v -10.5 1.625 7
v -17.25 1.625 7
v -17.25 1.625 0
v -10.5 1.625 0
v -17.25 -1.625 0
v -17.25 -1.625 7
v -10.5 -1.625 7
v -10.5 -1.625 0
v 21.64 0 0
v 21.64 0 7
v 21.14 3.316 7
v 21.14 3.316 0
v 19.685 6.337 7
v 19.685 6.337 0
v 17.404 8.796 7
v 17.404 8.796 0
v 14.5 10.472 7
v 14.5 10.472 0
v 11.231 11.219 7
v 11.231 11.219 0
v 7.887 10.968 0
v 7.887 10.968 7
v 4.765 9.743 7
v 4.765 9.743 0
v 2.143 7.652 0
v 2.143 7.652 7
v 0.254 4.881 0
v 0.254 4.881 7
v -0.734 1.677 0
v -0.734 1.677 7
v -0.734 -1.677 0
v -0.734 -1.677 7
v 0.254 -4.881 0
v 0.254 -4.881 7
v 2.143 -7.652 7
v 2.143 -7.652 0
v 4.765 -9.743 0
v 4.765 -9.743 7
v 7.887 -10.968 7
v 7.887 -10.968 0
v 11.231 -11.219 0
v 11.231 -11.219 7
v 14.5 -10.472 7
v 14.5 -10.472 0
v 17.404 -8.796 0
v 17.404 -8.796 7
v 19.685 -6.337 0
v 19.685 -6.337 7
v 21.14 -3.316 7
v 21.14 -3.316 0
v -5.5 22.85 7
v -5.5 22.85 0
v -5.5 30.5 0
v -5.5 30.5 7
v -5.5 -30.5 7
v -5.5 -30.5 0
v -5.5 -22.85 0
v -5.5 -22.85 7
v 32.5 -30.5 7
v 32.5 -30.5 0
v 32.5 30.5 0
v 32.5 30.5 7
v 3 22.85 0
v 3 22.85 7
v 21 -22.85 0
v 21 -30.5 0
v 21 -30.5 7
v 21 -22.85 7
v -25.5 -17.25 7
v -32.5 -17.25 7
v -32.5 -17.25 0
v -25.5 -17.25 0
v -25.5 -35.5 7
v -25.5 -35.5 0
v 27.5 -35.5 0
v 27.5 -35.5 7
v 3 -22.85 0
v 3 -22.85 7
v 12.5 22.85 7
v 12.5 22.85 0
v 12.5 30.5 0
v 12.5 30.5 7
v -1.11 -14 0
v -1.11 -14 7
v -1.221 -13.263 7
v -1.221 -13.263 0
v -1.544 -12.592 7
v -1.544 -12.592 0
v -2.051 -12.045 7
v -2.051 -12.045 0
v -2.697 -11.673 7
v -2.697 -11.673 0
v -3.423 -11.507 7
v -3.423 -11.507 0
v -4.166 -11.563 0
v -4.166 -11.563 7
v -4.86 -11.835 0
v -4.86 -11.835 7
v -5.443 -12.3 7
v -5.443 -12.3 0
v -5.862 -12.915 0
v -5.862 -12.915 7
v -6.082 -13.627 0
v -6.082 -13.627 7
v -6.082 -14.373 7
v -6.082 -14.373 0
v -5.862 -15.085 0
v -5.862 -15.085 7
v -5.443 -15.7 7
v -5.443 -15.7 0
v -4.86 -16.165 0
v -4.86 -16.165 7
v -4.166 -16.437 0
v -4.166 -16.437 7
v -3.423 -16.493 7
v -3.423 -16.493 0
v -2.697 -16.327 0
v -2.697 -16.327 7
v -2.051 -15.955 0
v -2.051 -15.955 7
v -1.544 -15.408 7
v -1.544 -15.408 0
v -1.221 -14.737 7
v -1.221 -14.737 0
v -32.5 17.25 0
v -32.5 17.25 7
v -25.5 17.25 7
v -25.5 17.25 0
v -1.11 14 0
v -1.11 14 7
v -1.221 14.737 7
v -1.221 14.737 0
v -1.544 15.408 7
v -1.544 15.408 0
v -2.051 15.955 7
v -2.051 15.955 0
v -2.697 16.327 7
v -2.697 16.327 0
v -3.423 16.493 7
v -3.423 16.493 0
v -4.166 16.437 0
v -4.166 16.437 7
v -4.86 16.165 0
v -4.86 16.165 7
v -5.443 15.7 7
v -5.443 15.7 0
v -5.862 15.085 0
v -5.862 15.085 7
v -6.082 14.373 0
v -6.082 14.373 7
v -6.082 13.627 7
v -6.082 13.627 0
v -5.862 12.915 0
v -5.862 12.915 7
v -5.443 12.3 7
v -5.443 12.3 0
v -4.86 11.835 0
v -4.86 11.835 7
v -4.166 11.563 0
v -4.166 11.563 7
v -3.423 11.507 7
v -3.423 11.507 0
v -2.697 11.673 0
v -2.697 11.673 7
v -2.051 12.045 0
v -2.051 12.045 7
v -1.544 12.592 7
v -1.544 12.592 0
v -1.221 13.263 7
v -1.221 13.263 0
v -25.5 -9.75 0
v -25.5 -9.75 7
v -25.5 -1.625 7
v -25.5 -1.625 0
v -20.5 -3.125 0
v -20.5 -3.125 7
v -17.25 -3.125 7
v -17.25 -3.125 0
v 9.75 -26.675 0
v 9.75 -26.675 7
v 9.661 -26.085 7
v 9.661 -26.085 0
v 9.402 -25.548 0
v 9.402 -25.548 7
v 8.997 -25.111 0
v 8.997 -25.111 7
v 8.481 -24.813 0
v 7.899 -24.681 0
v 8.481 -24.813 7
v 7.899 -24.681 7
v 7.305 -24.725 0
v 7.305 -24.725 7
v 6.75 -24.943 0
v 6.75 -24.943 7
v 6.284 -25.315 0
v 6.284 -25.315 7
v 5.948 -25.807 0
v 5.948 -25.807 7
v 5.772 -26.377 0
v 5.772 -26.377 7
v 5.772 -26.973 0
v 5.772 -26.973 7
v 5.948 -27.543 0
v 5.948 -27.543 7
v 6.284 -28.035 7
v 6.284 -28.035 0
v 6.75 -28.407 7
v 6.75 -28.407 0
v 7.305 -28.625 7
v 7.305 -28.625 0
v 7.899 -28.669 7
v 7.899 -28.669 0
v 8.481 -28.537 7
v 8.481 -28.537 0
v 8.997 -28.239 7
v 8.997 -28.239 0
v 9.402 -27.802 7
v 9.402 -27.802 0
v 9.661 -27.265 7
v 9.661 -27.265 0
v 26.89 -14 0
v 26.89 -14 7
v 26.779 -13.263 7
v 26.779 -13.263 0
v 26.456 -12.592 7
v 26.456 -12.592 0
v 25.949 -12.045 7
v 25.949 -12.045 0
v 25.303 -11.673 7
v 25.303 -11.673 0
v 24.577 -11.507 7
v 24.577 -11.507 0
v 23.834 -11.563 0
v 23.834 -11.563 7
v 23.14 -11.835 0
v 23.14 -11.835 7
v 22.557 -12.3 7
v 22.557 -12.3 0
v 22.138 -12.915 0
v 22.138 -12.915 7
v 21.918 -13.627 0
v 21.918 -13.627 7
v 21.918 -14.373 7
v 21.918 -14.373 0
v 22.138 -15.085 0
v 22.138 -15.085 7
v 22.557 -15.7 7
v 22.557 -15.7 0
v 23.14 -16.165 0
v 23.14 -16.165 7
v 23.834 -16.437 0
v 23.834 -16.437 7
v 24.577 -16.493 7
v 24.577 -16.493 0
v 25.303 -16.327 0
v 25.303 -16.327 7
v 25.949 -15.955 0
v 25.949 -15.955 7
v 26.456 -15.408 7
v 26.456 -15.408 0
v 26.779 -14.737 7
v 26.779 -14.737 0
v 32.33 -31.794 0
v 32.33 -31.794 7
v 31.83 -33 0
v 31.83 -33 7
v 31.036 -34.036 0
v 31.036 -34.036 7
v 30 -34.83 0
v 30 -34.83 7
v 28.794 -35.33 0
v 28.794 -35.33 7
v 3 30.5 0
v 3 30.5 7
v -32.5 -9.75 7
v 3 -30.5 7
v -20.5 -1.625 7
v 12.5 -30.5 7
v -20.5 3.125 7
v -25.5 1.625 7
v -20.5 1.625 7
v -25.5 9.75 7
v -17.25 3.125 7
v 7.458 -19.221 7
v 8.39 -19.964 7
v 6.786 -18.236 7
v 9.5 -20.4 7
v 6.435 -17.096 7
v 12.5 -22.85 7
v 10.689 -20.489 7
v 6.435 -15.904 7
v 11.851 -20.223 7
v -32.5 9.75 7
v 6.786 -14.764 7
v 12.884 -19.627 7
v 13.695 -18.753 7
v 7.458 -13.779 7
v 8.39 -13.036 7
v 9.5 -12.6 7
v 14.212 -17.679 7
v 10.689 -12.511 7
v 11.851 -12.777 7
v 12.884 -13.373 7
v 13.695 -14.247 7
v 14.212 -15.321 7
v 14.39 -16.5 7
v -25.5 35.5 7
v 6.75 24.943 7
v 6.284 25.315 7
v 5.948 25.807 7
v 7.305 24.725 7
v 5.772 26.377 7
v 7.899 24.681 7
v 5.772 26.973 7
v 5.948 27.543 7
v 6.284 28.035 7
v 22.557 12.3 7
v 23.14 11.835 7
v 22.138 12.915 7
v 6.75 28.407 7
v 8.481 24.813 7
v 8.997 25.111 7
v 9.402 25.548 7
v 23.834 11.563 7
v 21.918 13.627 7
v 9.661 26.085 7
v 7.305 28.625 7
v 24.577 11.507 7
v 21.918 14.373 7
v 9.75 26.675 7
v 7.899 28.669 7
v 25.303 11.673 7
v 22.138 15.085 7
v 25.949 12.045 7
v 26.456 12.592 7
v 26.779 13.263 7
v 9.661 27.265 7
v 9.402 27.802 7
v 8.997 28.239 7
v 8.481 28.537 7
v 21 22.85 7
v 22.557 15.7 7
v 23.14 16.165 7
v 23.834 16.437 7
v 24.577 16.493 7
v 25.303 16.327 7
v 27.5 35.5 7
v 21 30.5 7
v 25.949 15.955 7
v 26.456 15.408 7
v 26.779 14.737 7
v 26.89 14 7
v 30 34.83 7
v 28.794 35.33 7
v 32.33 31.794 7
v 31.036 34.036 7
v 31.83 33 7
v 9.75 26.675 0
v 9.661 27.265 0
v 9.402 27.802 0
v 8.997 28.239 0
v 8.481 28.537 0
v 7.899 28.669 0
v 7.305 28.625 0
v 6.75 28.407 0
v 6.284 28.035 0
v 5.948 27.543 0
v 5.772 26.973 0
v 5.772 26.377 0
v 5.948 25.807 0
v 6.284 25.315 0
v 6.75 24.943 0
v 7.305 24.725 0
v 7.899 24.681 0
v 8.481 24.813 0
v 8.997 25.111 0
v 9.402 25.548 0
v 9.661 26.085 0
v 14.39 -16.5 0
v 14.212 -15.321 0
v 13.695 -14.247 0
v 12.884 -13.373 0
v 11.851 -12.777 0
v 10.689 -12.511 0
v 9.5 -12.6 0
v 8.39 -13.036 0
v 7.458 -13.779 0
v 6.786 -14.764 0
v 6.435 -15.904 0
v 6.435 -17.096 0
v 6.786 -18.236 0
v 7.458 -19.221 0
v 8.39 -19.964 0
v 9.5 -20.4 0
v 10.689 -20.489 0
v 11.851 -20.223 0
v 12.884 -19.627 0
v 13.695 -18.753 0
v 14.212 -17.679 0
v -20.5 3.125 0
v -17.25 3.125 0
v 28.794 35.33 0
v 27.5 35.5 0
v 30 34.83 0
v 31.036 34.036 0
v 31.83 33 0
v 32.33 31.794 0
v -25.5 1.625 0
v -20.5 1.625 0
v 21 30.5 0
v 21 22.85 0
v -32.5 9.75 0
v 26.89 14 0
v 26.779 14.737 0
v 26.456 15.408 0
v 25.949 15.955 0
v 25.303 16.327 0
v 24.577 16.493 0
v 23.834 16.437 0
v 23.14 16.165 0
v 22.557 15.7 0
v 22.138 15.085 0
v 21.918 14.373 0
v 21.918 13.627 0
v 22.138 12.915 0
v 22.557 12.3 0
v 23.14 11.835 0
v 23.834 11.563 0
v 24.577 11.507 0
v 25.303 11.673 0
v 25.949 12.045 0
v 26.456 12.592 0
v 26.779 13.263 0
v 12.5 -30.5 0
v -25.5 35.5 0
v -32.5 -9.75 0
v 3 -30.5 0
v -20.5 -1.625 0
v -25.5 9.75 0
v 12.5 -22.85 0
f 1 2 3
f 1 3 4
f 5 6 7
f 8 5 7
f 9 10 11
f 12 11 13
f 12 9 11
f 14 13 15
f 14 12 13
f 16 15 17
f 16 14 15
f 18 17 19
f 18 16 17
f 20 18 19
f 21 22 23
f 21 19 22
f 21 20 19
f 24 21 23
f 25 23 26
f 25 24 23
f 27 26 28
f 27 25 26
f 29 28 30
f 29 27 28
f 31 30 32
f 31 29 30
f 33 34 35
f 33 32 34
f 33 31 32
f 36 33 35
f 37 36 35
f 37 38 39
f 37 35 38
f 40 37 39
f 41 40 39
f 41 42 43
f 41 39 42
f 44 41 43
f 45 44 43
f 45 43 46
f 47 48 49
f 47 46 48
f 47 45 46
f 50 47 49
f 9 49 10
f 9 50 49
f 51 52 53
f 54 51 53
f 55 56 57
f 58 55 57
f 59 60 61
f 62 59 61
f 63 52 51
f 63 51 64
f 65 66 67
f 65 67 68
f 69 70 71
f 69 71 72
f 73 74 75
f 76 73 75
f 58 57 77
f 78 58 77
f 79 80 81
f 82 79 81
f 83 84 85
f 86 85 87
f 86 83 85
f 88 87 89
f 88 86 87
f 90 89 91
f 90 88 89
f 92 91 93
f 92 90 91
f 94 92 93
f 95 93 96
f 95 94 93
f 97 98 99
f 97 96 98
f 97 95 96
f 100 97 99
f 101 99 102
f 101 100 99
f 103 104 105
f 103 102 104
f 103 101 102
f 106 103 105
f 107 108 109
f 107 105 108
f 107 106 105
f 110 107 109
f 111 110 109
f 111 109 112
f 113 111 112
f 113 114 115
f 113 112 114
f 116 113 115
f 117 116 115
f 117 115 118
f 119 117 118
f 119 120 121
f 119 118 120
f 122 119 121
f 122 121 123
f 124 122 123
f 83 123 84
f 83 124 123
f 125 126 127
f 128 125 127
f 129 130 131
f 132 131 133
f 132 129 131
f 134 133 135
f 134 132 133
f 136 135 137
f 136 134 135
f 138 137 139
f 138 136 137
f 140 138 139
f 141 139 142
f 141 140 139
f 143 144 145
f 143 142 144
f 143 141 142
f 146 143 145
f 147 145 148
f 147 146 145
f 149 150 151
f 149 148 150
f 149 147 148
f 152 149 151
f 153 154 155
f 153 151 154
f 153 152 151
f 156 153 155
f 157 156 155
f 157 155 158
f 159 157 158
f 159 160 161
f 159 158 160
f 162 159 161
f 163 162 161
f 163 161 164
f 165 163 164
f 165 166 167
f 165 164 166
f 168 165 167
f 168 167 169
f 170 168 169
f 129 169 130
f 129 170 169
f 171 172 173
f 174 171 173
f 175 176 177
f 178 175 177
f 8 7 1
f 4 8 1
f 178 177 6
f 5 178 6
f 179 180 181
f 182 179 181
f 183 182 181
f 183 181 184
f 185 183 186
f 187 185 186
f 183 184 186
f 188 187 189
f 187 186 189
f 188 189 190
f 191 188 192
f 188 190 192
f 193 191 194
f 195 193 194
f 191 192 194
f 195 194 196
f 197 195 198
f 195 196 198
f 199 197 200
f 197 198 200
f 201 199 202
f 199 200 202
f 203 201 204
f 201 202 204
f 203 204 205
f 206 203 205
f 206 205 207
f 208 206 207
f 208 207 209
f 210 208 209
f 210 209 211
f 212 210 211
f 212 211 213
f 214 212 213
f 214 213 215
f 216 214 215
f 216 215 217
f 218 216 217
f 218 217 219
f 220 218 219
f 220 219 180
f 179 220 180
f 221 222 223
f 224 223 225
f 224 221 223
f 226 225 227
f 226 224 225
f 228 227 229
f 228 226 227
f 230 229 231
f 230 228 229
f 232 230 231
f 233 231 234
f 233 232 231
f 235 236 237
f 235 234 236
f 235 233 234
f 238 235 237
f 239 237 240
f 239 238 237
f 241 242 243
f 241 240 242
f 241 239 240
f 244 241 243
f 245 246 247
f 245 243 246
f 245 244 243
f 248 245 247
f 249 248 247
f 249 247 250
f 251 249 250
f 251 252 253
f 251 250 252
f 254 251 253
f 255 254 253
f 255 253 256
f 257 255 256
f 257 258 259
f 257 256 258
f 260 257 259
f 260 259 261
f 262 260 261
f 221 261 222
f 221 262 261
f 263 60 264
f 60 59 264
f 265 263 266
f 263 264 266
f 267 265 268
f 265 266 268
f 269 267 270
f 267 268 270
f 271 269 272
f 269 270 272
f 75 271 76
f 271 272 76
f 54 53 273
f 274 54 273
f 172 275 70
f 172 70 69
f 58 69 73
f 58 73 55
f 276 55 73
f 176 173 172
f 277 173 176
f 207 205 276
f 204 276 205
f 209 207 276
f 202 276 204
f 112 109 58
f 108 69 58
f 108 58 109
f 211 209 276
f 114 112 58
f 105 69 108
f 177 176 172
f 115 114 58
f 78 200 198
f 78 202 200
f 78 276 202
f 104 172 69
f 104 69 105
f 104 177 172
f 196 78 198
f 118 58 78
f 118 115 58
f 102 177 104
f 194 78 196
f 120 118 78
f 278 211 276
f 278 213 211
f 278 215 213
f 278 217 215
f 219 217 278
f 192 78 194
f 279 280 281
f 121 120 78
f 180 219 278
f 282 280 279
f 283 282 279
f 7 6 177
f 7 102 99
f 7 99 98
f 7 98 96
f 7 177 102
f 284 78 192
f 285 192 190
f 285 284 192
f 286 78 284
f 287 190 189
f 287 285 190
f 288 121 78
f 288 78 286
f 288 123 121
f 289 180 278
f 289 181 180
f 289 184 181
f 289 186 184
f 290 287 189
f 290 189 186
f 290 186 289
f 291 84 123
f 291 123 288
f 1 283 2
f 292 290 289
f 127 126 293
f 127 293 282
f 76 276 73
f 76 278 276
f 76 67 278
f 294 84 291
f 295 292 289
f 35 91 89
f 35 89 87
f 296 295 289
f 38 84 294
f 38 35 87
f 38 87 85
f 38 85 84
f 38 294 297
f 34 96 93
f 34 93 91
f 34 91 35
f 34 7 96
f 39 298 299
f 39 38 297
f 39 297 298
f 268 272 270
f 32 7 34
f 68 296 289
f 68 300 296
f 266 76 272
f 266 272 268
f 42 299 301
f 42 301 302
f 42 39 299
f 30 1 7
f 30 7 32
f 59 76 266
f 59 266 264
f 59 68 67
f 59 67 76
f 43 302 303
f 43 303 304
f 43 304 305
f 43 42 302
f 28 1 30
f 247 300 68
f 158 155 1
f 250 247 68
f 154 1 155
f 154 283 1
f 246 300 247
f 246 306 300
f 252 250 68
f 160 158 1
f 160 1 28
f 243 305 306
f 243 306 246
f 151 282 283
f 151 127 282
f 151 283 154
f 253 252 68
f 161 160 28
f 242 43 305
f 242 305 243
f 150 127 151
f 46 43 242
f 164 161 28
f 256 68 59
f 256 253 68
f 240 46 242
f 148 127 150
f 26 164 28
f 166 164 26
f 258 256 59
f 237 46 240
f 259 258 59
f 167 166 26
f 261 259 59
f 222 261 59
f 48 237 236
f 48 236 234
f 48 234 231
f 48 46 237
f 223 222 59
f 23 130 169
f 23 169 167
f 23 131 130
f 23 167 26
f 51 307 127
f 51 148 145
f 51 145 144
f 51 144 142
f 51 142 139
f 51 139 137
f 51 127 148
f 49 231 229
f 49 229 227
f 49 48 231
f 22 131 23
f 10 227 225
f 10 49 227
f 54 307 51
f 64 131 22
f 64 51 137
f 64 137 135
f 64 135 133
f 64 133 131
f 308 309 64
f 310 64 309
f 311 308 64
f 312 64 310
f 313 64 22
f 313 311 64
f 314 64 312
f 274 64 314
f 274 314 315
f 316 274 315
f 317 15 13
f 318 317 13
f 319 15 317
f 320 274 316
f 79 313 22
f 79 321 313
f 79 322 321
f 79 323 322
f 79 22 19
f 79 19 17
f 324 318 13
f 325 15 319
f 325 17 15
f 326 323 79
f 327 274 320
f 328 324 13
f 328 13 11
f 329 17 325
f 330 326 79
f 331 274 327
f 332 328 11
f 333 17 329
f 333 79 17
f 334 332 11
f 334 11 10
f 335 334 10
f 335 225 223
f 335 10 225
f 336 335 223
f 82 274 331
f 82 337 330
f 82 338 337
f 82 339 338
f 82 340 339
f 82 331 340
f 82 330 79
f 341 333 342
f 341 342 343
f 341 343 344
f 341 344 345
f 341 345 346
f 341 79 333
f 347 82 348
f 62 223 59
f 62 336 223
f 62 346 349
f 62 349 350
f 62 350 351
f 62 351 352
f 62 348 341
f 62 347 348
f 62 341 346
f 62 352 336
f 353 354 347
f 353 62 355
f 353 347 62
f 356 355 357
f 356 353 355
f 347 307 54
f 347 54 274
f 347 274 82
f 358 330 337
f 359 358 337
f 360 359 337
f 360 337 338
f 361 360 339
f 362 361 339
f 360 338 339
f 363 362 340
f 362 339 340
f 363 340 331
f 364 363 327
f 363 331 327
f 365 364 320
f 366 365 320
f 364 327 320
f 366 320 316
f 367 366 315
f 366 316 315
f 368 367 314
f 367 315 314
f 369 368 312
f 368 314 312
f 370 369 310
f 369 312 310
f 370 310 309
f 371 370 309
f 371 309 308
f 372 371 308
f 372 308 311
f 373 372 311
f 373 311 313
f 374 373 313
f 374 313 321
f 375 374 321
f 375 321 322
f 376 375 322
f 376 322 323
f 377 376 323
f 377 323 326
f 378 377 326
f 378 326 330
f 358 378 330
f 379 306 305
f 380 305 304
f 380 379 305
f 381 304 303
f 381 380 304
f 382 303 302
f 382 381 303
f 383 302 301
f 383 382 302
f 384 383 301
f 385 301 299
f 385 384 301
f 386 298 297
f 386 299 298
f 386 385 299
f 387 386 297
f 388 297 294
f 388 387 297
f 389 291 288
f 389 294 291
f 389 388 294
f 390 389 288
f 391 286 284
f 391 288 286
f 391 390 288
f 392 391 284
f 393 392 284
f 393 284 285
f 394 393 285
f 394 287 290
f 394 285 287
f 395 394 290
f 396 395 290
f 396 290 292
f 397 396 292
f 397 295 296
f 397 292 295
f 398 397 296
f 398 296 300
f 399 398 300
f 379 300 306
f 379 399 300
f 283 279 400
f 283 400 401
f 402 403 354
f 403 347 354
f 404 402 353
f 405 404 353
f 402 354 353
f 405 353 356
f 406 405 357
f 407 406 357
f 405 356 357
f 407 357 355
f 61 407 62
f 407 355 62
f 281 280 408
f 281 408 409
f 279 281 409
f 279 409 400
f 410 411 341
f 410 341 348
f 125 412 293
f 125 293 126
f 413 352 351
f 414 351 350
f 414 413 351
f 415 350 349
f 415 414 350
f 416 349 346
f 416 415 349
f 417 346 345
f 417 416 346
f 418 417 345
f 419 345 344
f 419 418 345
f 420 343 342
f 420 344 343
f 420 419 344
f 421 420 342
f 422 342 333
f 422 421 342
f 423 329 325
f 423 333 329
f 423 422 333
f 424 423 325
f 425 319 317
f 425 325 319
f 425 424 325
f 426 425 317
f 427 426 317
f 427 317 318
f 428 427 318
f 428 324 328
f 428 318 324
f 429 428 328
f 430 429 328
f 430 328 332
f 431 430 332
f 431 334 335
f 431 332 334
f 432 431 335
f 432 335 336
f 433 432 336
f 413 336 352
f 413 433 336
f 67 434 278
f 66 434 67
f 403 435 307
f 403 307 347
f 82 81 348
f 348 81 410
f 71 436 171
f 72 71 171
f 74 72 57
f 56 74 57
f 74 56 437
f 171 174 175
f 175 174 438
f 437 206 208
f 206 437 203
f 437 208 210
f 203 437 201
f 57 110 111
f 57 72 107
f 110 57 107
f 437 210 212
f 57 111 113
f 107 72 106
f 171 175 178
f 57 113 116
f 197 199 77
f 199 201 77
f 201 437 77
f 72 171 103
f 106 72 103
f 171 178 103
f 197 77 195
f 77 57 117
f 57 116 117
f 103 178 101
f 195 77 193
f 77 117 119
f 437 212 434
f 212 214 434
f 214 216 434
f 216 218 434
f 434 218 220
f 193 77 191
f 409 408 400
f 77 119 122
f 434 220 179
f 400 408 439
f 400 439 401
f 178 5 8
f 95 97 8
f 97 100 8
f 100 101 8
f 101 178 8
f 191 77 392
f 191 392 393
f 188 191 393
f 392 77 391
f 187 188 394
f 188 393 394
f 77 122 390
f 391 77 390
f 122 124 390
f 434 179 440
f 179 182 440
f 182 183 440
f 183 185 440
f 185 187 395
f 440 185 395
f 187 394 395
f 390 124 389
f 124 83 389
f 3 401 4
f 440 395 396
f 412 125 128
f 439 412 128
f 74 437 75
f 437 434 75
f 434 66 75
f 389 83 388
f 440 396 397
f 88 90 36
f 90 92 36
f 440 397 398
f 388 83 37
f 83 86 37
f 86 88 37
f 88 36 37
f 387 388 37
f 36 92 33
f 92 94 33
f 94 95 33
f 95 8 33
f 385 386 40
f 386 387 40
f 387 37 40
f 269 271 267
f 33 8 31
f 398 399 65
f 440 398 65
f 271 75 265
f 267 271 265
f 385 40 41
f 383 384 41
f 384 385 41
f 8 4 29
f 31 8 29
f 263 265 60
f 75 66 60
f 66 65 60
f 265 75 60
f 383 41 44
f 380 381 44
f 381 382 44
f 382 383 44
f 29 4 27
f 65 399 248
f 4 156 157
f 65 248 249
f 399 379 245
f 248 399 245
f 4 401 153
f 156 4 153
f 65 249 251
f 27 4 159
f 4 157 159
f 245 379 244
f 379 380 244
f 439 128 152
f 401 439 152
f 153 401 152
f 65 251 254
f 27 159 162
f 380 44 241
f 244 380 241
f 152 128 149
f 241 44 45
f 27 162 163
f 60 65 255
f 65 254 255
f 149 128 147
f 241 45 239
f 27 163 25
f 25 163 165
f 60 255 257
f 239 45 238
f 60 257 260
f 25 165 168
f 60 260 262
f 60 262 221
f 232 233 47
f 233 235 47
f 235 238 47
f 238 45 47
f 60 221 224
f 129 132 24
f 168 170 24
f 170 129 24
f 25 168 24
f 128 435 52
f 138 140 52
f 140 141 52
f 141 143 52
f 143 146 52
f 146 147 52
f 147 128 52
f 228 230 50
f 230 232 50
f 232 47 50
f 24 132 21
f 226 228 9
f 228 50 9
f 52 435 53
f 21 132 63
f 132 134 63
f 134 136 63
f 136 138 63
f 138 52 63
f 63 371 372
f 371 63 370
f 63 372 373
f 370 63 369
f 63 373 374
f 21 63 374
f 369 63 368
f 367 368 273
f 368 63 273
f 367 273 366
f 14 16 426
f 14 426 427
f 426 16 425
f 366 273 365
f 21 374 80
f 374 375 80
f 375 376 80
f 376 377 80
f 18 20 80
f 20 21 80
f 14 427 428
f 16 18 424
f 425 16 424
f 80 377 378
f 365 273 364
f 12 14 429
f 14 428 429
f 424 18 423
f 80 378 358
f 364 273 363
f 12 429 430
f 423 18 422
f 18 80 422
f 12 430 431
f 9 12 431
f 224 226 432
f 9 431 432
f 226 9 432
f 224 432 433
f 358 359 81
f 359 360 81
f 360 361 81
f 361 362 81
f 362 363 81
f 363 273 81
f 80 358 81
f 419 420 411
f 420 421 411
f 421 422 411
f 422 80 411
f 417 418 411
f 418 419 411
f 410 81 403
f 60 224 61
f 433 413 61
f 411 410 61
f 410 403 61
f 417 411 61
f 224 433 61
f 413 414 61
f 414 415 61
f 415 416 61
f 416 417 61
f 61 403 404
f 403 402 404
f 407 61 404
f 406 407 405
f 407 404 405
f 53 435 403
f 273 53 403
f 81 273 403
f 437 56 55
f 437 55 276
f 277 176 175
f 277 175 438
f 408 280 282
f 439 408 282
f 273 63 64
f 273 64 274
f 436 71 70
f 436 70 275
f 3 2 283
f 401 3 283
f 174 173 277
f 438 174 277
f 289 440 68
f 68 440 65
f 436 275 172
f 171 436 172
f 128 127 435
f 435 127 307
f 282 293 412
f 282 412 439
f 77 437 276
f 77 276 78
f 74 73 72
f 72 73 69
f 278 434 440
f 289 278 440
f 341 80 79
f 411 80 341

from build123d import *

# Parameters (mm, degrees)
F0_W      = 65
F0_H      = 71
F0_W_2    = 8.5
F0_H_2    = 7.65
F2_DEPTH  = 7
F1_R      = 4
F1_R_2    = 11.25
F1_R_3    = 2.5
F3_DEPTH  = 25
F4_R      = 2
F5_DEPTH  = 7.001
F6_W      = 7
F6_H      = 18.25
F6_H_2    = 19.5
F7_DEPTH  = 7.001
F8_W      = 30
F8_H      = 3.25
F9_W      = 3.25
F9_H      = 6.25
F10_DEPTH = 7.001
F11_R     = 5


with BuildPart() as f2:
    # F0 (on Top) → F2 (new body)
    with BuildSketch(Plane.XY):
        Rectangle(F0_W, F0_H)
        with Locations((-1.25, -26.675)):
            Rectangle(F0_W_2, F0_H_2, mode=Mode.SUBTRACT)
        with Locations((16.75, -26.675)):
            Rectangle(F0_W_2, F0_H_2, mode=Mode.SUBTRACT)
        with Locations((-1.25, 26.675)):
            Rectangle(F0_W_2, F0_H_2, mode=Mode.SUBTRACT)
        with Locations((16.75, 26.675)):
            Rectangle(F0_W_2, F0_H_2, mode=Mode.SUBTRACT)
    extrude(amount=F2_DEPTH)

    # F1 (on face) → F3 (cut)
    with BuildSketch(Plane.XY):
        with Locations((10.39, -16.5)):
            Circle(F1_R)
        with Locations((10.39, 0)):
            Circle(F1_R_2)
        with Locations((-3.61, 14)):
            Circle(F1_R_3)
        with Locations((24.39, 14)):
            Circle(F1_R_3)
        with Locations((24.39, -14)):
            Circle(F1_R_3)
        with Locations((-3.61, -14)):
            Circle(F1_R_3)
    extrude(amount=F3_DEPTH, mode=Mode.SUBTRACT)

    # F4 (on face) → F5 (cut, through all)
    with BuildSketch(Plane.XY.offset(7)):
        with Locations((7.75, 26.675)):
            Circle(F4_R)
        with Locations((7.75, -26.675)):
            Circle(F4_R)
    extrude(amount=-F5_DEPTH, mode=Mode.SUBTRACT)

    # F6 (on face) → F7 (cut, through all)
    with BuildSketch(Plane.XY.offset(7)):
        with Locations((-29, 26.375)):
            Rectangle(F6_W, F6_H)
        with Locations((-29, -26.375)):
            Rectangle(F6_W, F6_H)
        with Locations((-29, 0)):
            Rectangle(F6_W, F6_H_2)
    extrude(amount=-F7_DEPTH, mode=Mode.SUBTRACT)

    # F8 (on face) + F9 (on face) → F10 (cut, through all)
    with BuildSketch(Plane.XY.offset(7)):
        with Locations((-25.5, 0)):
            Rectangle(F8_W, F8_H)
    with BuildSketch(Plane.XY.offset(7)):
        with Locations((-18.875, 0)):
            Rectangle(F9_W, F9_H)
    extrude(amount=-F10_DEPTH, mode=Mode.SUBTRACT)

    # F11
    f11_edges = [f2.edges().sort_by_distance(p)[0] for p in [
        (32.5, -35.5, 3.5),
        (32.5, 35.5, 3.5),
    ]]
    fillet(f11_edges, radius=F11_R)


solid = f2.part
